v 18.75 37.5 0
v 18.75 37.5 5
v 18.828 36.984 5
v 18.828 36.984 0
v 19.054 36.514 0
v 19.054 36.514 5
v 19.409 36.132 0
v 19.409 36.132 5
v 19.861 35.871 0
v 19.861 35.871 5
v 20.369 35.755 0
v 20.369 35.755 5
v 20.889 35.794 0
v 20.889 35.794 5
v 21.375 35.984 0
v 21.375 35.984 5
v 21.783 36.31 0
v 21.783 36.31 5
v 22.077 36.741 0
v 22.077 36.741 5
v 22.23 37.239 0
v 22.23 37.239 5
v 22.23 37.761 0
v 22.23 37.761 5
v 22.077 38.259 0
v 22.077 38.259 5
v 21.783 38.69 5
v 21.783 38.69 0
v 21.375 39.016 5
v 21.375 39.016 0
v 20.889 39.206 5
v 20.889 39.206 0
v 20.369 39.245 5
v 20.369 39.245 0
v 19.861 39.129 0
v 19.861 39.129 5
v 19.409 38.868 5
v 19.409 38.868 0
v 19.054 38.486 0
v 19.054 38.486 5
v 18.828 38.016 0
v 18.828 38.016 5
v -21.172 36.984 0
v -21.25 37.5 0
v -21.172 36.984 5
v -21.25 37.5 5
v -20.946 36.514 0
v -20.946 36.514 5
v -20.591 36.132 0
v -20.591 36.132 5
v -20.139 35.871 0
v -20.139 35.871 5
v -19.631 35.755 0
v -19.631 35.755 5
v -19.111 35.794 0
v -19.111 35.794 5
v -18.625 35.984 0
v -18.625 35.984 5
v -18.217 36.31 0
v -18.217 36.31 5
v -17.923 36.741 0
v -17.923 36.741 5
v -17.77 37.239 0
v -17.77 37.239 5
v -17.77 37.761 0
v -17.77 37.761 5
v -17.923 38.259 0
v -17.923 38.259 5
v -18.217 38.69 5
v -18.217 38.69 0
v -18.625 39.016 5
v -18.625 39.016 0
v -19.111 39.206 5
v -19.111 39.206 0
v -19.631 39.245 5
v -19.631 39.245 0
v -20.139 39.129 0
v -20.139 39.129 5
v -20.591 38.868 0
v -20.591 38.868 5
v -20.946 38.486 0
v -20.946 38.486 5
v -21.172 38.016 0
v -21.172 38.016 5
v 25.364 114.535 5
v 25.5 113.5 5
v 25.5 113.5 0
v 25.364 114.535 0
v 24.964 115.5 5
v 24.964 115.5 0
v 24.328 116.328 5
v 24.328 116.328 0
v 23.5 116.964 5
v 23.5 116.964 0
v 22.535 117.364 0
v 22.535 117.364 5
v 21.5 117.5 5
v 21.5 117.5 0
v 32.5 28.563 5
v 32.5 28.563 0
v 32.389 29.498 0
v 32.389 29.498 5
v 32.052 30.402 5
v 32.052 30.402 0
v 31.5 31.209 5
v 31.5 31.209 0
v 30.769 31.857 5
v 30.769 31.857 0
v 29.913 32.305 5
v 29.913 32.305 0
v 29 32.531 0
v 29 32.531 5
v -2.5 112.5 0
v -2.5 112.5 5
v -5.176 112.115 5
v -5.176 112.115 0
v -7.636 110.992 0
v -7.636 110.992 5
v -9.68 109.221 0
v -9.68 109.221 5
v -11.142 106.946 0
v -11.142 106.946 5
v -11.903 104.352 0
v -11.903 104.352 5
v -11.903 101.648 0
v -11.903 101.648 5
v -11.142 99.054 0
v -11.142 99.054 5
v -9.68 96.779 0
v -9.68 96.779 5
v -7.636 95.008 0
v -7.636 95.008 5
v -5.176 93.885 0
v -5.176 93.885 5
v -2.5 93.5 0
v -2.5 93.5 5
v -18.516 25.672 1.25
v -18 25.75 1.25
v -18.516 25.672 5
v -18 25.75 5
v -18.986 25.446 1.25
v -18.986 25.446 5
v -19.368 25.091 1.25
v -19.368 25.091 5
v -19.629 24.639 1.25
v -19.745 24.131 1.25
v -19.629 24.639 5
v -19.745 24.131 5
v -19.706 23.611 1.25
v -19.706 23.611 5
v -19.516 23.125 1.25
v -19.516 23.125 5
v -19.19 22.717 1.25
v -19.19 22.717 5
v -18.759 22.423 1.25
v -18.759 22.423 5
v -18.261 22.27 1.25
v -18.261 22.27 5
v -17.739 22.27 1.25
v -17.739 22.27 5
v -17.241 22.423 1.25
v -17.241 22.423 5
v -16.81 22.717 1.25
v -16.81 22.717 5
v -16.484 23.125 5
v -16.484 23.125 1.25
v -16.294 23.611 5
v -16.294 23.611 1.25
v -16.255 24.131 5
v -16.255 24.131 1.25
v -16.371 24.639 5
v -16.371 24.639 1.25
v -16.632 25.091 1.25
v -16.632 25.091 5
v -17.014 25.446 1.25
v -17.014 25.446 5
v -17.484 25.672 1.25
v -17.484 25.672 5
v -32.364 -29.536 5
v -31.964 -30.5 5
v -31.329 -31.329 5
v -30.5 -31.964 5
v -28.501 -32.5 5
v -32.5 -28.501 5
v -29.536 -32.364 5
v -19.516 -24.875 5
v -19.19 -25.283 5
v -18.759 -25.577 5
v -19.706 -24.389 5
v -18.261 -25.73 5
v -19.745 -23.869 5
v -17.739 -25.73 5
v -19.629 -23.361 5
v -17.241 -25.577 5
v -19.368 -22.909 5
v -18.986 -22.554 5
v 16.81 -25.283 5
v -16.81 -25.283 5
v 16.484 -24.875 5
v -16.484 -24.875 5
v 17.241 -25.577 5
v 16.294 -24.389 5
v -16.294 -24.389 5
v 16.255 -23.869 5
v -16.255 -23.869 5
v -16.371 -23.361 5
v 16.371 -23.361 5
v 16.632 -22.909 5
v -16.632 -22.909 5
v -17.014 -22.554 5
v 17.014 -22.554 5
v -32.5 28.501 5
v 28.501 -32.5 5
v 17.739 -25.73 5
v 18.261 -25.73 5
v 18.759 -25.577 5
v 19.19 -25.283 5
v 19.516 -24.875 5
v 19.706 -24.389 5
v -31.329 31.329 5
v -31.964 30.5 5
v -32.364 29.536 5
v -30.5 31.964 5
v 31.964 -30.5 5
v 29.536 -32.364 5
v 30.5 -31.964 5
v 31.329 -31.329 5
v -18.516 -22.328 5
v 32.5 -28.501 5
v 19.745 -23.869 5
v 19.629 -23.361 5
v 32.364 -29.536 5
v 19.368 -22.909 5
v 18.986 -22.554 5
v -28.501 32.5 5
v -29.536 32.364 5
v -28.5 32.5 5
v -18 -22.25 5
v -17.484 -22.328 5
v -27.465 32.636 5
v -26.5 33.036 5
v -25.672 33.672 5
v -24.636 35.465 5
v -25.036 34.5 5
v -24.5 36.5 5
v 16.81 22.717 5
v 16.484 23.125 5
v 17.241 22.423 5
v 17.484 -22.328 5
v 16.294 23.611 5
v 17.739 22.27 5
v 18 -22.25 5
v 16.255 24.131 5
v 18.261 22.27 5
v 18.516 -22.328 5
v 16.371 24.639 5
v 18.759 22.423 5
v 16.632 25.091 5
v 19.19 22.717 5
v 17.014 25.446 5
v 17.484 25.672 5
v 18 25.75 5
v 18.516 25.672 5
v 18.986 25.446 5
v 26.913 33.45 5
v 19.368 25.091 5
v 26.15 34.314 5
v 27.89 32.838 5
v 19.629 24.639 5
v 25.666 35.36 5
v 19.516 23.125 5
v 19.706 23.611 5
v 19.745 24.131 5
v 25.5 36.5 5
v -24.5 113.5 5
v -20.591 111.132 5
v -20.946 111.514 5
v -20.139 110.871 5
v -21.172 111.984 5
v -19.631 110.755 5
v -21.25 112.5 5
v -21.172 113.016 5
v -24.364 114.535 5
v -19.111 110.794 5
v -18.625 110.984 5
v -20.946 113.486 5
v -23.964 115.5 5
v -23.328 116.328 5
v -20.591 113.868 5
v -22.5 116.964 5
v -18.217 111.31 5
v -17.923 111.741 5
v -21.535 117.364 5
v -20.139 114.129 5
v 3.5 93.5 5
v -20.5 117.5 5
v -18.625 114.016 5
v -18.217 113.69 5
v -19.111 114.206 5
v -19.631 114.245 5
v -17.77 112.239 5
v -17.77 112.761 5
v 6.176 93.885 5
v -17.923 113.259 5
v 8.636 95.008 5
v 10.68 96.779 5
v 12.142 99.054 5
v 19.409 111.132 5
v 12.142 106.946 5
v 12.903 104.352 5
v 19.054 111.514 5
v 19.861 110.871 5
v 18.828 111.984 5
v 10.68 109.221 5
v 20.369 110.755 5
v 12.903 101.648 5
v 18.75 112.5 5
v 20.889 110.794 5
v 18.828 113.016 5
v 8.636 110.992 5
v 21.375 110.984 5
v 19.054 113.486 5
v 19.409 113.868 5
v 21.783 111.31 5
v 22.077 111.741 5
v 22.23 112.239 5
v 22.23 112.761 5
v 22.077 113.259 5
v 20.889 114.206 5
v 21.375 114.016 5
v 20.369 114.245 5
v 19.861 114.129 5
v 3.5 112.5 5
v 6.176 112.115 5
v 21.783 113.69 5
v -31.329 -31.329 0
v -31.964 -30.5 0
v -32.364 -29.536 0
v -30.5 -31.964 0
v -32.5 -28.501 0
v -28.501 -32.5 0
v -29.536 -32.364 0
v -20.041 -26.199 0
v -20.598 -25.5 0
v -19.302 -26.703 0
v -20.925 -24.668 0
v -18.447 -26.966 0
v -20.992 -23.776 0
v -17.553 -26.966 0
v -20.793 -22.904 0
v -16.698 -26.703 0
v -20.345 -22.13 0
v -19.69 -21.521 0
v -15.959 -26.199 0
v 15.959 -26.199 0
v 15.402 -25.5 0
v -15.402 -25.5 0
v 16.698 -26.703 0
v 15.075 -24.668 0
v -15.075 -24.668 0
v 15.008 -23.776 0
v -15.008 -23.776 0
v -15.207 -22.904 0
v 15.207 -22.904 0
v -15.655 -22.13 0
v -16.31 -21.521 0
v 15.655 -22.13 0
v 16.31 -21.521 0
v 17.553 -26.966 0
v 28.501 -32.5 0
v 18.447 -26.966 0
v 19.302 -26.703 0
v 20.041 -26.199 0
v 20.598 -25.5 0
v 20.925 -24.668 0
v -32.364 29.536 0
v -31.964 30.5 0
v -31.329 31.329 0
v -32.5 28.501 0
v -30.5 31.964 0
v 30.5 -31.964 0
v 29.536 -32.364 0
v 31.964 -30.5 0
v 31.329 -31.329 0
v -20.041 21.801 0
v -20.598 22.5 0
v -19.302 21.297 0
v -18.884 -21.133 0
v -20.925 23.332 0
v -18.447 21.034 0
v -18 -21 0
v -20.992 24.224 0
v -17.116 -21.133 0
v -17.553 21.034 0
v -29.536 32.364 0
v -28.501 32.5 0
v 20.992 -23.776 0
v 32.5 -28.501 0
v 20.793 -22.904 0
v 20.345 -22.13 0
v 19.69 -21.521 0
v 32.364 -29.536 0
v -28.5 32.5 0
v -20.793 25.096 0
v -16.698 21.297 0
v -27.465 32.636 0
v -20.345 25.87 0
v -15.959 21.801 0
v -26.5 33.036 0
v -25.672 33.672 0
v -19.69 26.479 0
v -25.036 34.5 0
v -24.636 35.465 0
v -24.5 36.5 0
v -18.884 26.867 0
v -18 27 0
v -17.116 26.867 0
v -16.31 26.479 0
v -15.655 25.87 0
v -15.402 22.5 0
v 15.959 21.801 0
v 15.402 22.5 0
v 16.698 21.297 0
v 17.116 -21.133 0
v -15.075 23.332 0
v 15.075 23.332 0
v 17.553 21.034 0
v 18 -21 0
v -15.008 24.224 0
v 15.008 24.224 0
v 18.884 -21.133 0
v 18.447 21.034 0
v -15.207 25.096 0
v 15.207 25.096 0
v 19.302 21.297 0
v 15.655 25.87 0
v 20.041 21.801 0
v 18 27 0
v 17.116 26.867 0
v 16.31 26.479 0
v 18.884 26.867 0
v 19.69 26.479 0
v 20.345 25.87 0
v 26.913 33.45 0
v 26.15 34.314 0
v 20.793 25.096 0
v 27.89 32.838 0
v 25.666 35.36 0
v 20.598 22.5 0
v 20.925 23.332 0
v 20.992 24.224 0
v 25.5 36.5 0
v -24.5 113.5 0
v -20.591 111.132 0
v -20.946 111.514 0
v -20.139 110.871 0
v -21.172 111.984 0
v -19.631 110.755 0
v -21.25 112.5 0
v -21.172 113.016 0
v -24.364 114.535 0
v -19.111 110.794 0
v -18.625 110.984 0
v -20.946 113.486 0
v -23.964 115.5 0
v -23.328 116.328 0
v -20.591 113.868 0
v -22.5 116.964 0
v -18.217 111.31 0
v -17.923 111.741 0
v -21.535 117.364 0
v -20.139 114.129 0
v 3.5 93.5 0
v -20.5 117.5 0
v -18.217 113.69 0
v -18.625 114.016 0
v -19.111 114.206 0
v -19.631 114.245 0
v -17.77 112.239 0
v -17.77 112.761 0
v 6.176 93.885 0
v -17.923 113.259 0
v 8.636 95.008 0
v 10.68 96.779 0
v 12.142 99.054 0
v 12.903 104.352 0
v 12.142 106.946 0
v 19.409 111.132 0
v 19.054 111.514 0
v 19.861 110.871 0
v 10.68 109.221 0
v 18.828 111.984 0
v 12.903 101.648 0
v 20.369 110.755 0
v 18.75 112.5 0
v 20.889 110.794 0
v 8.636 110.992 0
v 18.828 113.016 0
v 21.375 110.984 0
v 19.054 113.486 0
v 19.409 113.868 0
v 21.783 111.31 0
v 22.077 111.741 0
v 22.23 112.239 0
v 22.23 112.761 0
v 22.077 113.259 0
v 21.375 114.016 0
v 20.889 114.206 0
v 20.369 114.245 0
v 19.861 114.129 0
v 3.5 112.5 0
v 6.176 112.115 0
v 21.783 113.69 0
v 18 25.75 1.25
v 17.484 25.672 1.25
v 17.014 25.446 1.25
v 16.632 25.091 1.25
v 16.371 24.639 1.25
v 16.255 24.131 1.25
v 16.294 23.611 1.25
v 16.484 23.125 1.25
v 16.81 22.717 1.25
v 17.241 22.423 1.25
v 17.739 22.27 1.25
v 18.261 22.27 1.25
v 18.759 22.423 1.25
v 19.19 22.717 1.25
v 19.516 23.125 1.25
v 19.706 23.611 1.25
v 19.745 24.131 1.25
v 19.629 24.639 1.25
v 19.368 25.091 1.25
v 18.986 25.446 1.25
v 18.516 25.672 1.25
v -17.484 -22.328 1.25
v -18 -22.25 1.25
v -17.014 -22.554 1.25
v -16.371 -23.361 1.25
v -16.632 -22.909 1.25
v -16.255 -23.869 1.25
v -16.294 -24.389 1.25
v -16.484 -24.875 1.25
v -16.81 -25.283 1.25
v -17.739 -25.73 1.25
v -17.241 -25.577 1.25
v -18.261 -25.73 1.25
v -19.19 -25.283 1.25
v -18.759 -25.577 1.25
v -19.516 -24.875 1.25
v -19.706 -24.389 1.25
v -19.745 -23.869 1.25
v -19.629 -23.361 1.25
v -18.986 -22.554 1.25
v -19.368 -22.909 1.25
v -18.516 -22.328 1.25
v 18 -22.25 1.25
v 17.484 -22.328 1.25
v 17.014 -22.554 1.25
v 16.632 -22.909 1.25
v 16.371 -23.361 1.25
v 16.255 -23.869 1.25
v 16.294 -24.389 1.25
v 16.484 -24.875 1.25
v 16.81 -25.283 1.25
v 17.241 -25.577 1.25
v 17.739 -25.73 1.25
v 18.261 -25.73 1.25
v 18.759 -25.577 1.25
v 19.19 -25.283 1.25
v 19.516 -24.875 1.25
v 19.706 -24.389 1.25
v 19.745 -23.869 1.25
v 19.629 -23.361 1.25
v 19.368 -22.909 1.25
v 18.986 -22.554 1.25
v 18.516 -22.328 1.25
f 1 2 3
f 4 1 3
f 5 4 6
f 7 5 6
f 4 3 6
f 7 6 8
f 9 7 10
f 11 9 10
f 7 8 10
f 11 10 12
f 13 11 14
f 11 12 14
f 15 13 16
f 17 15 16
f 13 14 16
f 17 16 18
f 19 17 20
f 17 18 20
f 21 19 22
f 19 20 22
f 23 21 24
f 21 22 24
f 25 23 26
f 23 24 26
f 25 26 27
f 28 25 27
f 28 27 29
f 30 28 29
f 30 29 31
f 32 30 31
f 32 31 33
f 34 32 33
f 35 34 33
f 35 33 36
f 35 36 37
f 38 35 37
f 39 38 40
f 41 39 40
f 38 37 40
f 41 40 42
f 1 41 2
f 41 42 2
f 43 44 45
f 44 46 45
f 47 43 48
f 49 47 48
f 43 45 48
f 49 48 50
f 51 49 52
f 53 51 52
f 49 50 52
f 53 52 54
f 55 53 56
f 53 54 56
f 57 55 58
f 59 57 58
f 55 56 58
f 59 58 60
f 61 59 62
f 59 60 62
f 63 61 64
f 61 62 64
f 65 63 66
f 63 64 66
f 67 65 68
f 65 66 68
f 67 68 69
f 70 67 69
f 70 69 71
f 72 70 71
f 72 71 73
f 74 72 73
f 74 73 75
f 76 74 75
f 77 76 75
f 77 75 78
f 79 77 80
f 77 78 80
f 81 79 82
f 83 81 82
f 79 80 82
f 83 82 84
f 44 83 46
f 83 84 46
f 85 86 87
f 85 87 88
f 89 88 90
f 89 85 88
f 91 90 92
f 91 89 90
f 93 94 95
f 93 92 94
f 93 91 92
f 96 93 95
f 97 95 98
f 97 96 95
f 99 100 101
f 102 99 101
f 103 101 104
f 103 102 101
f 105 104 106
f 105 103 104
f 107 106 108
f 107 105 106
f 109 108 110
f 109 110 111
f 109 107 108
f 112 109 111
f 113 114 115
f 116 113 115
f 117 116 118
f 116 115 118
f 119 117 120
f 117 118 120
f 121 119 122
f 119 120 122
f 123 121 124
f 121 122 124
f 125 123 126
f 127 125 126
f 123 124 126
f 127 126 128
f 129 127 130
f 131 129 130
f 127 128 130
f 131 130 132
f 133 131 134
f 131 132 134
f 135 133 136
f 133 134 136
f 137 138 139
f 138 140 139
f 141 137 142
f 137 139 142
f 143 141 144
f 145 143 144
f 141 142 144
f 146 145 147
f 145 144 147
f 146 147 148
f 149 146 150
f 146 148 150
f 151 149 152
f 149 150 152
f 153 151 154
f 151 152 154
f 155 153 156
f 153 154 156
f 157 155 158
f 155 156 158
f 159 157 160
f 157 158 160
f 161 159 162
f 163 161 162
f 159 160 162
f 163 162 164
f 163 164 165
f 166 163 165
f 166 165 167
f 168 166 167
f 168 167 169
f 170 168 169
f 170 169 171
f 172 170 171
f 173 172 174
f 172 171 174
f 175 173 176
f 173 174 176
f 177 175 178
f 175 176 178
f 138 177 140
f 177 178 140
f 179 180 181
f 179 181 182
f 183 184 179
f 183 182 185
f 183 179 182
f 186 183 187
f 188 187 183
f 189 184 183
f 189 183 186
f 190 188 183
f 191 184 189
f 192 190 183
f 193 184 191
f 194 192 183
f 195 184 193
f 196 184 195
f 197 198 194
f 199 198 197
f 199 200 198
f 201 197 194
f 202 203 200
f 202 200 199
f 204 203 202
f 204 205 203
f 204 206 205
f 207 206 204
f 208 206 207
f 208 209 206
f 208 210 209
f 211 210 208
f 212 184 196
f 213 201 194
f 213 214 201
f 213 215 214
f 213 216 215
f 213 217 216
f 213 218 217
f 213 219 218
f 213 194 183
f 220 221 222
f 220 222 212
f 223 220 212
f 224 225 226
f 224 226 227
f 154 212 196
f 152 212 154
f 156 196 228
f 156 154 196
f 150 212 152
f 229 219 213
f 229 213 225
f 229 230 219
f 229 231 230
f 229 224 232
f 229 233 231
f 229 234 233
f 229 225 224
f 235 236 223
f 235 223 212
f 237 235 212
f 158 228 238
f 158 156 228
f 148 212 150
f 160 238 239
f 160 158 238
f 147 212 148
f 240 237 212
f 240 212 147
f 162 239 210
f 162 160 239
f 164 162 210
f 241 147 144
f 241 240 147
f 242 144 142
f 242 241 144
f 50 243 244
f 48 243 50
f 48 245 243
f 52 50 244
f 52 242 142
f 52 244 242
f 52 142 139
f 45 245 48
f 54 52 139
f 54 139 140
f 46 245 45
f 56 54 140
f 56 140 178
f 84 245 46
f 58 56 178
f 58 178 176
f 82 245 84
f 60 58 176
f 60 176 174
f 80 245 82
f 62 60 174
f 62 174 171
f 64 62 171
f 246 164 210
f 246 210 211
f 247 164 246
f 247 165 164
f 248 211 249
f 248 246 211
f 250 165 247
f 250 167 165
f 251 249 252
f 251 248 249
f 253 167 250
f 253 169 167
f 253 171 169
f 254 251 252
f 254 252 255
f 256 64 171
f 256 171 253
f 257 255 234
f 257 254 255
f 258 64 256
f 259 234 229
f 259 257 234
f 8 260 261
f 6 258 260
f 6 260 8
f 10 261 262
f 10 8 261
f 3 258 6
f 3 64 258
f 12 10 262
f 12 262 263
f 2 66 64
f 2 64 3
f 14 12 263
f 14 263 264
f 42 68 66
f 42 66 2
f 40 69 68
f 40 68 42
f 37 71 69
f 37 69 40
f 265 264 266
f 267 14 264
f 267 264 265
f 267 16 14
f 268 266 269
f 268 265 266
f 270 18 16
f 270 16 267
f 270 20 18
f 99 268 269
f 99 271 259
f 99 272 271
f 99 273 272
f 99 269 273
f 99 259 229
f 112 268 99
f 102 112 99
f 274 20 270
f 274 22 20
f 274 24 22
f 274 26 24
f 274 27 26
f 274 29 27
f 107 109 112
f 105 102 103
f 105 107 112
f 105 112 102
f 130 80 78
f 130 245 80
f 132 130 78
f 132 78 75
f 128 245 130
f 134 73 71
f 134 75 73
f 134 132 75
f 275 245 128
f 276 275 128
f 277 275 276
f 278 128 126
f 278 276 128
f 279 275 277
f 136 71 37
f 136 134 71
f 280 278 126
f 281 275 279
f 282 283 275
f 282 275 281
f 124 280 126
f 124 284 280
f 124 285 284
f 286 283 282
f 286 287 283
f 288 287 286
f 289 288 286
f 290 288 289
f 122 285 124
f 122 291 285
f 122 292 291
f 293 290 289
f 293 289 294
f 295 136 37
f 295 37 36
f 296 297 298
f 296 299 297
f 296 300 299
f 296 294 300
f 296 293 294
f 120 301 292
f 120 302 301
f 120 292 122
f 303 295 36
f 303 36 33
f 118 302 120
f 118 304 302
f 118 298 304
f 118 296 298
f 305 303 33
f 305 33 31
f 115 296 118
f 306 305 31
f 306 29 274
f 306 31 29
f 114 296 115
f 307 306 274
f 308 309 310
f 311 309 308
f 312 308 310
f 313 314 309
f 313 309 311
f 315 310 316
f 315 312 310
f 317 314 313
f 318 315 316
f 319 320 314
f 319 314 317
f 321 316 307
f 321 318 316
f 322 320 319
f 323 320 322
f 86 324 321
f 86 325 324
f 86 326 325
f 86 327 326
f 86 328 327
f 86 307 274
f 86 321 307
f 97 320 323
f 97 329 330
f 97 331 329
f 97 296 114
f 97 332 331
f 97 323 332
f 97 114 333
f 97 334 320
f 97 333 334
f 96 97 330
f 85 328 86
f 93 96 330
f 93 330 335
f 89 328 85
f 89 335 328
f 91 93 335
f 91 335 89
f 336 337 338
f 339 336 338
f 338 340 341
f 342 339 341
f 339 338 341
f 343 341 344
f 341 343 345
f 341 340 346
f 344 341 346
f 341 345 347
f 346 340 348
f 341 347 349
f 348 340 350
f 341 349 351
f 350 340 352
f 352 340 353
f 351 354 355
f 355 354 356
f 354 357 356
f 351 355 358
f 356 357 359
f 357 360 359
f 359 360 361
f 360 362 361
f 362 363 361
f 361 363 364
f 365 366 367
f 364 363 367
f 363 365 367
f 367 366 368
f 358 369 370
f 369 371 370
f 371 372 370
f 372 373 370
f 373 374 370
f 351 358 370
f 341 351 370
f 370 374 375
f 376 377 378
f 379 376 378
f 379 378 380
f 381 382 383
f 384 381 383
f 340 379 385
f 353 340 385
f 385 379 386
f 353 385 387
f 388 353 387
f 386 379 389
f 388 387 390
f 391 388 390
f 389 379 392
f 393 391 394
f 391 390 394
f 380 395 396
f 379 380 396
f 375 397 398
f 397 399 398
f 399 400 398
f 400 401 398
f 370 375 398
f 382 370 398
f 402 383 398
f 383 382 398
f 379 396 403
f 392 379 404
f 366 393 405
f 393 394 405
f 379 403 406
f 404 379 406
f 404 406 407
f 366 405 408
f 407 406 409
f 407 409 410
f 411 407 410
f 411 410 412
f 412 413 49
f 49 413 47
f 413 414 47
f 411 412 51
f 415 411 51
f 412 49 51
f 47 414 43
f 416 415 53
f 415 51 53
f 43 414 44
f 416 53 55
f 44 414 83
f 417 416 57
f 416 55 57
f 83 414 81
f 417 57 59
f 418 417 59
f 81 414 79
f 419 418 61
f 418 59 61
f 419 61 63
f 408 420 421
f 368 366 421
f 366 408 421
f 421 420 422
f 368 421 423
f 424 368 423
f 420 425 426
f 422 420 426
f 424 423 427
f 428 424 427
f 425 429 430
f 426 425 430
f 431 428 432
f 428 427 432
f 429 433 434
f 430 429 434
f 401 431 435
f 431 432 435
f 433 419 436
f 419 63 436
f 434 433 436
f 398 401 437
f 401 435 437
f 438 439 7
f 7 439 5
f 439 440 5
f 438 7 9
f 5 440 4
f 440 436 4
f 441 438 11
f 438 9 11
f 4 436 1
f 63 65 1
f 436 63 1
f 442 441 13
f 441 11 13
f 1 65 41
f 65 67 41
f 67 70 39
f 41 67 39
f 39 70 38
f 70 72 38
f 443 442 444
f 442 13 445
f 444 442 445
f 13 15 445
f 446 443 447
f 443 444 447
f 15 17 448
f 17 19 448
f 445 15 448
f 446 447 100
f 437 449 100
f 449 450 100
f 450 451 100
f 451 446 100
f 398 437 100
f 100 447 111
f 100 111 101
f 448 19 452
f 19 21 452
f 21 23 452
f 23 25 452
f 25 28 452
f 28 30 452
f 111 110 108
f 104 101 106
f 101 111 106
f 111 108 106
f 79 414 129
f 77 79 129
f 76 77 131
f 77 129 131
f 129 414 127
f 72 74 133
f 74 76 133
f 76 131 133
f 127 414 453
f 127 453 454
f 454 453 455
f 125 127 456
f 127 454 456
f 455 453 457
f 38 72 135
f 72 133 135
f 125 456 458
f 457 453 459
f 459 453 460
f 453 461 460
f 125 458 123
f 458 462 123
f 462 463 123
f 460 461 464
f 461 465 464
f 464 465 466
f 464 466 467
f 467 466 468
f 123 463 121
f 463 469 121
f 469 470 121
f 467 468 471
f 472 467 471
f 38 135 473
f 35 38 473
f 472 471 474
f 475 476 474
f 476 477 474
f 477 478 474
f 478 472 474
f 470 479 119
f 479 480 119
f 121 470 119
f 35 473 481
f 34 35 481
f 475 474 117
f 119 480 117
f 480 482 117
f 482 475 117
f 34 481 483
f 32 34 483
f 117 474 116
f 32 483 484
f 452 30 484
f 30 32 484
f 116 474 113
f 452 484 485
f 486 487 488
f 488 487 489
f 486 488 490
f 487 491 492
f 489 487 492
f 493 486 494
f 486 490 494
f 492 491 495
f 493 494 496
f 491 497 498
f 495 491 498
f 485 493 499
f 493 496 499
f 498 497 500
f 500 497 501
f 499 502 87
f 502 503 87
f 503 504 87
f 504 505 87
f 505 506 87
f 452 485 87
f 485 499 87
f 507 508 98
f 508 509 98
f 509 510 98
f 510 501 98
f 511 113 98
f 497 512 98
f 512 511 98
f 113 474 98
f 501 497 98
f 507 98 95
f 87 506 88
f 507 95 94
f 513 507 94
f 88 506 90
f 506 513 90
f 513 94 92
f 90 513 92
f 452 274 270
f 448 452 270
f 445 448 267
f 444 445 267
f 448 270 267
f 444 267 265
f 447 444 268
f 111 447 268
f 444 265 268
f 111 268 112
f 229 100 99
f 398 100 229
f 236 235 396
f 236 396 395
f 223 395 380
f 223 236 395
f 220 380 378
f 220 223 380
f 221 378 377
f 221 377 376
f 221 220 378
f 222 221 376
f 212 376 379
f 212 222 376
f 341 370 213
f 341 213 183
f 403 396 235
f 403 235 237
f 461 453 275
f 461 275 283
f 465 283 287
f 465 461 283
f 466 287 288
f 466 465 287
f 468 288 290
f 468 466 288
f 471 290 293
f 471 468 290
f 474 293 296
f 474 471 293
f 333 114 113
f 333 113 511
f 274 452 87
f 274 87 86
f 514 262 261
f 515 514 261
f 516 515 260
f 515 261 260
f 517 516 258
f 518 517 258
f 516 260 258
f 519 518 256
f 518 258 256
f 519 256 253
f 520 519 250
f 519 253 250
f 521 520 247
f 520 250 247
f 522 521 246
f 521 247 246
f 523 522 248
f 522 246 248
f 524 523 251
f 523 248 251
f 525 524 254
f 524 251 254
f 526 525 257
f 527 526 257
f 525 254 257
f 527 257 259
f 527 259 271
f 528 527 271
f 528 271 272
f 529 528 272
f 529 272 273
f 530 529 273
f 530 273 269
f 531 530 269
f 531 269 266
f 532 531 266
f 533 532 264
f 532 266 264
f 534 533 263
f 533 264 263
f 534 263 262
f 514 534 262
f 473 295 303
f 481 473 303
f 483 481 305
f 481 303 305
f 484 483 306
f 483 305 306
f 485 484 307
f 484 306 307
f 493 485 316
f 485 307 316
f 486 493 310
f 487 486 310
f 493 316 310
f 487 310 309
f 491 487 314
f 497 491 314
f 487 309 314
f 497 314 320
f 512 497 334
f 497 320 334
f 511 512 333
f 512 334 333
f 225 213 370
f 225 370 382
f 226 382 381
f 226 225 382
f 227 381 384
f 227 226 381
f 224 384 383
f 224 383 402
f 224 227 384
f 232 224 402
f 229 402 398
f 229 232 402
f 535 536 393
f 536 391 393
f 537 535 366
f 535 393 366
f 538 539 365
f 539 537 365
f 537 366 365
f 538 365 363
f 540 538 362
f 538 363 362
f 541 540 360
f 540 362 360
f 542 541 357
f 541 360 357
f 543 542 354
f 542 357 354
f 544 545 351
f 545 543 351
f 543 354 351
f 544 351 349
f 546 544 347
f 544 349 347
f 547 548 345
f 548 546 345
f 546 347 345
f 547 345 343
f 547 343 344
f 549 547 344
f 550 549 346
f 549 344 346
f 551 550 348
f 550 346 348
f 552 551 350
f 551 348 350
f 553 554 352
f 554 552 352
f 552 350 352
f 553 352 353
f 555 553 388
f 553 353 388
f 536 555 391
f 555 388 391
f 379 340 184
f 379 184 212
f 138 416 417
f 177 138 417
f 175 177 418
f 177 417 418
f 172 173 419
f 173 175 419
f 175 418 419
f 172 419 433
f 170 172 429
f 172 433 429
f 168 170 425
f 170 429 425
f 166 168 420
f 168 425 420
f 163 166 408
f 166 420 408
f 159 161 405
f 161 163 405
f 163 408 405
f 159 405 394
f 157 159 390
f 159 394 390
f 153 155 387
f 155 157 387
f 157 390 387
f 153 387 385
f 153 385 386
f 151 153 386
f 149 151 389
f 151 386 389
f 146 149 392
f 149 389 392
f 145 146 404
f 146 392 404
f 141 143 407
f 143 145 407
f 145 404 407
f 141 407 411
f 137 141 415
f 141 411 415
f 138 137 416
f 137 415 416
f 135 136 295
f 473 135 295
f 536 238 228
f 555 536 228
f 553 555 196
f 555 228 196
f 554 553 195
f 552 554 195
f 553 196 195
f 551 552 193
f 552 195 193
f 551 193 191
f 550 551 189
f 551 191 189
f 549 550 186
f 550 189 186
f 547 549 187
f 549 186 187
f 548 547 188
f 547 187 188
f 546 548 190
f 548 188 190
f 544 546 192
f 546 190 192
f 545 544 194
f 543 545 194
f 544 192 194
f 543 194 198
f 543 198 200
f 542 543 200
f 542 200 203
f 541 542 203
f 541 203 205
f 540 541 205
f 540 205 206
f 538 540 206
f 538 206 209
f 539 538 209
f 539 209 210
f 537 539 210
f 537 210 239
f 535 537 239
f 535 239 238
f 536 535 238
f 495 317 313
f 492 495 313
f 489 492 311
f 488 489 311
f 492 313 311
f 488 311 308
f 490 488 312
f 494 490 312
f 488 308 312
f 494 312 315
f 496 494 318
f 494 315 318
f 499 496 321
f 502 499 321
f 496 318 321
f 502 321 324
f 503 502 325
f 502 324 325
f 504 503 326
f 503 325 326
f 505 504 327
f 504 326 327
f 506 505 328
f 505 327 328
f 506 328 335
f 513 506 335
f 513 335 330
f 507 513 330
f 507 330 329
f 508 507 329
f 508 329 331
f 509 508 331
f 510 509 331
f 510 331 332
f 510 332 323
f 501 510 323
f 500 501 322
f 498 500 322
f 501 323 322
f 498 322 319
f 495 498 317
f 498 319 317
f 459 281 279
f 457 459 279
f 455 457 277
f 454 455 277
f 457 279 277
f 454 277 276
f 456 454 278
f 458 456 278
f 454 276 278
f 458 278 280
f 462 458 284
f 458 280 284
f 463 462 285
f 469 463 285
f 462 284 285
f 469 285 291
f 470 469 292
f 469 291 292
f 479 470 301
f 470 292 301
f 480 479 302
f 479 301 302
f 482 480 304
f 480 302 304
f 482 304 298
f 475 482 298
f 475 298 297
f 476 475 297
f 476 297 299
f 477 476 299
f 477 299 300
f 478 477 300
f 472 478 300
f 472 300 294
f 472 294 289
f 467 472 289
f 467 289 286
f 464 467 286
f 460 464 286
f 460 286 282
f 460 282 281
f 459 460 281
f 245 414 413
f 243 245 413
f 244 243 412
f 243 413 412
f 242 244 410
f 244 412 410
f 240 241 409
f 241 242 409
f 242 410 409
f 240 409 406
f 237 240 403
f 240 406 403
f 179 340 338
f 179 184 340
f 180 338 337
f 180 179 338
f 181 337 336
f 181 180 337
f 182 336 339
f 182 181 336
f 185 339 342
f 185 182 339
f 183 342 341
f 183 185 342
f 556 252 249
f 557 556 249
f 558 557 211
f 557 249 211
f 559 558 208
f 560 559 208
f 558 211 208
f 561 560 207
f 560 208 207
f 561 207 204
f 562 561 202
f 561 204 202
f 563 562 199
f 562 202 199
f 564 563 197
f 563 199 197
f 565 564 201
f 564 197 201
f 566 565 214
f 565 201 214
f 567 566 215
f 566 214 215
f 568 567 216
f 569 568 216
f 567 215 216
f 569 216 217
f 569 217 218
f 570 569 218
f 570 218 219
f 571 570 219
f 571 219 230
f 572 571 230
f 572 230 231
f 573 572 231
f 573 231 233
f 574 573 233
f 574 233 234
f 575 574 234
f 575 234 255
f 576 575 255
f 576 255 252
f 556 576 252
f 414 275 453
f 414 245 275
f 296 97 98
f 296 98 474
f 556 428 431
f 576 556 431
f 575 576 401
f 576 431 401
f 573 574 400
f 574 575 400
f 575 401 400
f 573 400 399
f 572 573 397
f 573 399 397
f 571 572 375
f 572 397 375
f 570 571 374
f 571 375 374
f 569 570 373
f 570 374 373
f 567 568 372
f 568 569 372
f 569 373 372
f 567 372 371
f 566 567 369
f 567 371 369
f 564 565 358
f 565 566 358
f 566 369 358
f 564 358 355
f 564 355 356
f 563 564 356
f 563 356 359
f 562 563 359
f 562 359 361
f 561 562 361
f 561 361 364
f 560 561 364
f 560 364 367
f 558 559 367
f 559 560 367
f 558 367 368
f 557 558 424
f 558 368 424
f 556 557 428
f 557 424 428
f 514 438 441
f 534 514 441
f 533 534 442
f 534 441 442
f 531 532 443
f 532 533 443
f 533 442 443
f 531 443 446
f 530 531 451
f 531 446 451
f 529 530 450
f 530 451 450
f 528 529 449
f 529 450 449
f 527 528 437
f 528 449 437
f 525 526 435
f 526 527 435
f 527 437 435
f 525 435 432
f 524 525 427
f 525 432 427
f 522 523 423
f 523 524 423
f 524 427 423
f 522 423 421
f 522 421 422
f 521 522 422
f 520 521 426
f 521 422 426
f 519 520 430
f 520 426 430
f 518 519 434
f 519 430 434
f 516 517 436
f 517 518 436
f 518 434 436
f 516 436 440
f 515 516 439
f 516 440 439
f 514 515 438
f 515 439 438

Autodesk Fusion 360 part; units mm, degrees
sketch "Sketch1" plane through (0, 0, 0) normal (0, 0, 1) x (1, 0, 0)
  line L0 (-32.5, 32.5) -> (32.5, 32.5)
  line L1 (32.5, 32.5) -> (32.5, -32.5)
  line L2 (32.5, -32.5) -> (-32.5, -32.5)
  line L3 (-32.5, -32.5) -> (-32.5, 32.5)
  point P0 (-18, 24)
  point P1 (18, 24)
  point P2 (18, -24)
  point P3 (-18, -24)
  dimension "d1" = 65
  dimension "d2" = 65
  dimension "d3" = 32.5
  dimension "d4" = 32.5
  dimension "d5" = 14.5
  dimension "d6" = 14.5
  dimension "d7" = 14.5
  dimension "d8" = 14.5
  dimension "d9" = 8.5
  dimension "d10" = 8.5
  dimension "d11" = 8.5
  dimension "d12" = 8.5
extrude "Extrude1" add sketch "Sketch1" along normal blind 5
hole "Hole1" at (-18, -24, 0) at (18, -24, 0) at (18, 24, 0) at (-18, 24, 0) direction (0, 0, 1) diameter 3.5 depth 5 tip angle 180 countersink diameter 6 countersink angle 90
sketch "Sketch2" plane through (0, 32.5, 0) normal (0, 1, 0) x (-1, 0, 0)
  line L0 (-32.5, 0) -> (32.5, 0)
  line L1 (32.5, 0) -> (32.5, 5)
  line L2 (32.5, 5) -> (-32.5, 5)
  line L3 (-32.5, 5) -> (-32.5, 0)
  line L4 (-25.5, 5) -> (24.5, 5)
  line L5 (24.5, 5) -> (24.5, 0)
  line L6 (24.5, 0) -> (-25.5, 0)
  line L7 (-25.5, 0) -> (-25.5, 5)
  dimension "d20" = 50
  dimension "d21" = 7
extrude "Extrude2" add sketch "Sketch2" along normal blind 85 contours L0 L2 L4 L5 L6 L7
sketch "Sketch3" plane through (0, 0, 5) normal (0, 0, 1) x (-1, 0, 0)
  circle A0 centre (-18, -24) radius 1.75
  circle A1 centre (18, 24) radius 1.75
  circle A2 centre (-18, 24) radius 1.75
  circle A3 centre (18, -24) radius 1.75
  line L0 (32.5, 32.5) -> (-32.5, 32.5)
  line L1 (-32.5, 32.5) -> (-32.5, -32.5)
  line L2 (-32.5, -32.5) -> (-25.5, -32.5)
  line L3 (-25.5, -32.5) -> (-25.5, -117.5)
  line L4 (-25.5, -117.5) -> (24.5, -117.5)
  line L5 (24.5, -117.5) -> (24.5, -32.5)
  line L6 (24.5, -32.5) -> (32.5, -32.5)
  line L7 (32.5, -32.5) -> (32.5, 32.5)
  line L8 (24.5, -32.5) -> (-25.5, -32.5) construction
  line L9 (2.5, -112.5) -> (-3.5, -112.5)
  line L10 (2.5, -93.5) -> (-3.5, -93.5)
  arc A4 (-3.5, -93.5) -> (-3.5, -112.5) centre (-3.5, -103) ccw
  arc A5 (2.5, -112.5) -> (2.5, -93.5) centre (2.5, -103) ccw
  circle A6 centre (19.5, -37.5) radius 1.75
  circle A7 centre (-20.5, -37.5) radius 1.75
  circle A8 centre (-20.5, -112.5) radius 1.75
  circle A9 centre (19.5, -112.5) radius 1.75
  point P0 (12, -103)
  point P1 (-13, -103)
  dimension "d27" = 19
  dimension "d29" = 22
  dimension "d30" = 3.5
  dimension "d31" = 3.5
  dimension "d32" = 3.5
  dimension "d33" = 3.5
  dimension "d34" = 5
  dimension "d35" = 5
  dimension "d36" = 5
  dimension "d37" = 5
  dimension "d39" = 5
  dimension "d40" = 5
  dimension "d48" = 22
  dimension "d49" = 5
extrude "Extrude3" cut sketch "Sketch3" against normal blind 5 contours L9 L10 A4 A5 | A6 | A7 | A8 | A9
fillet "Fillet1" radius 4 4 edges at (25.5, 32.5, 2.5) (25.5, 117.5, 2.5) (-24.5, 117.5, 2.5) (-24.5, 32.5, 2.5)
fillet "Fillet2" radius 4 4 edges at (32.5, -32.5, 2.5) (-32.5, -32.5, 2.5) (-32.5, 32.5, 2.5) (32.5, 32.5, 2.5)
equation "d3 = ( 65 / 2 ) * 1 mm"
equation "d4 = ( 65 / 2 ) * 1 mm"
equation "d5 = 13 mm + ( 3 / 2 ) * 1 mm"
equation "d9 = 7 mm + ( ( 3 / 2 ) * 1 mm )"
equation "d21 = ( ( 64 - 50 ) / 2 ) * 1 mm"
equation "d27 = 23.5 mm - 4.5 mm"
